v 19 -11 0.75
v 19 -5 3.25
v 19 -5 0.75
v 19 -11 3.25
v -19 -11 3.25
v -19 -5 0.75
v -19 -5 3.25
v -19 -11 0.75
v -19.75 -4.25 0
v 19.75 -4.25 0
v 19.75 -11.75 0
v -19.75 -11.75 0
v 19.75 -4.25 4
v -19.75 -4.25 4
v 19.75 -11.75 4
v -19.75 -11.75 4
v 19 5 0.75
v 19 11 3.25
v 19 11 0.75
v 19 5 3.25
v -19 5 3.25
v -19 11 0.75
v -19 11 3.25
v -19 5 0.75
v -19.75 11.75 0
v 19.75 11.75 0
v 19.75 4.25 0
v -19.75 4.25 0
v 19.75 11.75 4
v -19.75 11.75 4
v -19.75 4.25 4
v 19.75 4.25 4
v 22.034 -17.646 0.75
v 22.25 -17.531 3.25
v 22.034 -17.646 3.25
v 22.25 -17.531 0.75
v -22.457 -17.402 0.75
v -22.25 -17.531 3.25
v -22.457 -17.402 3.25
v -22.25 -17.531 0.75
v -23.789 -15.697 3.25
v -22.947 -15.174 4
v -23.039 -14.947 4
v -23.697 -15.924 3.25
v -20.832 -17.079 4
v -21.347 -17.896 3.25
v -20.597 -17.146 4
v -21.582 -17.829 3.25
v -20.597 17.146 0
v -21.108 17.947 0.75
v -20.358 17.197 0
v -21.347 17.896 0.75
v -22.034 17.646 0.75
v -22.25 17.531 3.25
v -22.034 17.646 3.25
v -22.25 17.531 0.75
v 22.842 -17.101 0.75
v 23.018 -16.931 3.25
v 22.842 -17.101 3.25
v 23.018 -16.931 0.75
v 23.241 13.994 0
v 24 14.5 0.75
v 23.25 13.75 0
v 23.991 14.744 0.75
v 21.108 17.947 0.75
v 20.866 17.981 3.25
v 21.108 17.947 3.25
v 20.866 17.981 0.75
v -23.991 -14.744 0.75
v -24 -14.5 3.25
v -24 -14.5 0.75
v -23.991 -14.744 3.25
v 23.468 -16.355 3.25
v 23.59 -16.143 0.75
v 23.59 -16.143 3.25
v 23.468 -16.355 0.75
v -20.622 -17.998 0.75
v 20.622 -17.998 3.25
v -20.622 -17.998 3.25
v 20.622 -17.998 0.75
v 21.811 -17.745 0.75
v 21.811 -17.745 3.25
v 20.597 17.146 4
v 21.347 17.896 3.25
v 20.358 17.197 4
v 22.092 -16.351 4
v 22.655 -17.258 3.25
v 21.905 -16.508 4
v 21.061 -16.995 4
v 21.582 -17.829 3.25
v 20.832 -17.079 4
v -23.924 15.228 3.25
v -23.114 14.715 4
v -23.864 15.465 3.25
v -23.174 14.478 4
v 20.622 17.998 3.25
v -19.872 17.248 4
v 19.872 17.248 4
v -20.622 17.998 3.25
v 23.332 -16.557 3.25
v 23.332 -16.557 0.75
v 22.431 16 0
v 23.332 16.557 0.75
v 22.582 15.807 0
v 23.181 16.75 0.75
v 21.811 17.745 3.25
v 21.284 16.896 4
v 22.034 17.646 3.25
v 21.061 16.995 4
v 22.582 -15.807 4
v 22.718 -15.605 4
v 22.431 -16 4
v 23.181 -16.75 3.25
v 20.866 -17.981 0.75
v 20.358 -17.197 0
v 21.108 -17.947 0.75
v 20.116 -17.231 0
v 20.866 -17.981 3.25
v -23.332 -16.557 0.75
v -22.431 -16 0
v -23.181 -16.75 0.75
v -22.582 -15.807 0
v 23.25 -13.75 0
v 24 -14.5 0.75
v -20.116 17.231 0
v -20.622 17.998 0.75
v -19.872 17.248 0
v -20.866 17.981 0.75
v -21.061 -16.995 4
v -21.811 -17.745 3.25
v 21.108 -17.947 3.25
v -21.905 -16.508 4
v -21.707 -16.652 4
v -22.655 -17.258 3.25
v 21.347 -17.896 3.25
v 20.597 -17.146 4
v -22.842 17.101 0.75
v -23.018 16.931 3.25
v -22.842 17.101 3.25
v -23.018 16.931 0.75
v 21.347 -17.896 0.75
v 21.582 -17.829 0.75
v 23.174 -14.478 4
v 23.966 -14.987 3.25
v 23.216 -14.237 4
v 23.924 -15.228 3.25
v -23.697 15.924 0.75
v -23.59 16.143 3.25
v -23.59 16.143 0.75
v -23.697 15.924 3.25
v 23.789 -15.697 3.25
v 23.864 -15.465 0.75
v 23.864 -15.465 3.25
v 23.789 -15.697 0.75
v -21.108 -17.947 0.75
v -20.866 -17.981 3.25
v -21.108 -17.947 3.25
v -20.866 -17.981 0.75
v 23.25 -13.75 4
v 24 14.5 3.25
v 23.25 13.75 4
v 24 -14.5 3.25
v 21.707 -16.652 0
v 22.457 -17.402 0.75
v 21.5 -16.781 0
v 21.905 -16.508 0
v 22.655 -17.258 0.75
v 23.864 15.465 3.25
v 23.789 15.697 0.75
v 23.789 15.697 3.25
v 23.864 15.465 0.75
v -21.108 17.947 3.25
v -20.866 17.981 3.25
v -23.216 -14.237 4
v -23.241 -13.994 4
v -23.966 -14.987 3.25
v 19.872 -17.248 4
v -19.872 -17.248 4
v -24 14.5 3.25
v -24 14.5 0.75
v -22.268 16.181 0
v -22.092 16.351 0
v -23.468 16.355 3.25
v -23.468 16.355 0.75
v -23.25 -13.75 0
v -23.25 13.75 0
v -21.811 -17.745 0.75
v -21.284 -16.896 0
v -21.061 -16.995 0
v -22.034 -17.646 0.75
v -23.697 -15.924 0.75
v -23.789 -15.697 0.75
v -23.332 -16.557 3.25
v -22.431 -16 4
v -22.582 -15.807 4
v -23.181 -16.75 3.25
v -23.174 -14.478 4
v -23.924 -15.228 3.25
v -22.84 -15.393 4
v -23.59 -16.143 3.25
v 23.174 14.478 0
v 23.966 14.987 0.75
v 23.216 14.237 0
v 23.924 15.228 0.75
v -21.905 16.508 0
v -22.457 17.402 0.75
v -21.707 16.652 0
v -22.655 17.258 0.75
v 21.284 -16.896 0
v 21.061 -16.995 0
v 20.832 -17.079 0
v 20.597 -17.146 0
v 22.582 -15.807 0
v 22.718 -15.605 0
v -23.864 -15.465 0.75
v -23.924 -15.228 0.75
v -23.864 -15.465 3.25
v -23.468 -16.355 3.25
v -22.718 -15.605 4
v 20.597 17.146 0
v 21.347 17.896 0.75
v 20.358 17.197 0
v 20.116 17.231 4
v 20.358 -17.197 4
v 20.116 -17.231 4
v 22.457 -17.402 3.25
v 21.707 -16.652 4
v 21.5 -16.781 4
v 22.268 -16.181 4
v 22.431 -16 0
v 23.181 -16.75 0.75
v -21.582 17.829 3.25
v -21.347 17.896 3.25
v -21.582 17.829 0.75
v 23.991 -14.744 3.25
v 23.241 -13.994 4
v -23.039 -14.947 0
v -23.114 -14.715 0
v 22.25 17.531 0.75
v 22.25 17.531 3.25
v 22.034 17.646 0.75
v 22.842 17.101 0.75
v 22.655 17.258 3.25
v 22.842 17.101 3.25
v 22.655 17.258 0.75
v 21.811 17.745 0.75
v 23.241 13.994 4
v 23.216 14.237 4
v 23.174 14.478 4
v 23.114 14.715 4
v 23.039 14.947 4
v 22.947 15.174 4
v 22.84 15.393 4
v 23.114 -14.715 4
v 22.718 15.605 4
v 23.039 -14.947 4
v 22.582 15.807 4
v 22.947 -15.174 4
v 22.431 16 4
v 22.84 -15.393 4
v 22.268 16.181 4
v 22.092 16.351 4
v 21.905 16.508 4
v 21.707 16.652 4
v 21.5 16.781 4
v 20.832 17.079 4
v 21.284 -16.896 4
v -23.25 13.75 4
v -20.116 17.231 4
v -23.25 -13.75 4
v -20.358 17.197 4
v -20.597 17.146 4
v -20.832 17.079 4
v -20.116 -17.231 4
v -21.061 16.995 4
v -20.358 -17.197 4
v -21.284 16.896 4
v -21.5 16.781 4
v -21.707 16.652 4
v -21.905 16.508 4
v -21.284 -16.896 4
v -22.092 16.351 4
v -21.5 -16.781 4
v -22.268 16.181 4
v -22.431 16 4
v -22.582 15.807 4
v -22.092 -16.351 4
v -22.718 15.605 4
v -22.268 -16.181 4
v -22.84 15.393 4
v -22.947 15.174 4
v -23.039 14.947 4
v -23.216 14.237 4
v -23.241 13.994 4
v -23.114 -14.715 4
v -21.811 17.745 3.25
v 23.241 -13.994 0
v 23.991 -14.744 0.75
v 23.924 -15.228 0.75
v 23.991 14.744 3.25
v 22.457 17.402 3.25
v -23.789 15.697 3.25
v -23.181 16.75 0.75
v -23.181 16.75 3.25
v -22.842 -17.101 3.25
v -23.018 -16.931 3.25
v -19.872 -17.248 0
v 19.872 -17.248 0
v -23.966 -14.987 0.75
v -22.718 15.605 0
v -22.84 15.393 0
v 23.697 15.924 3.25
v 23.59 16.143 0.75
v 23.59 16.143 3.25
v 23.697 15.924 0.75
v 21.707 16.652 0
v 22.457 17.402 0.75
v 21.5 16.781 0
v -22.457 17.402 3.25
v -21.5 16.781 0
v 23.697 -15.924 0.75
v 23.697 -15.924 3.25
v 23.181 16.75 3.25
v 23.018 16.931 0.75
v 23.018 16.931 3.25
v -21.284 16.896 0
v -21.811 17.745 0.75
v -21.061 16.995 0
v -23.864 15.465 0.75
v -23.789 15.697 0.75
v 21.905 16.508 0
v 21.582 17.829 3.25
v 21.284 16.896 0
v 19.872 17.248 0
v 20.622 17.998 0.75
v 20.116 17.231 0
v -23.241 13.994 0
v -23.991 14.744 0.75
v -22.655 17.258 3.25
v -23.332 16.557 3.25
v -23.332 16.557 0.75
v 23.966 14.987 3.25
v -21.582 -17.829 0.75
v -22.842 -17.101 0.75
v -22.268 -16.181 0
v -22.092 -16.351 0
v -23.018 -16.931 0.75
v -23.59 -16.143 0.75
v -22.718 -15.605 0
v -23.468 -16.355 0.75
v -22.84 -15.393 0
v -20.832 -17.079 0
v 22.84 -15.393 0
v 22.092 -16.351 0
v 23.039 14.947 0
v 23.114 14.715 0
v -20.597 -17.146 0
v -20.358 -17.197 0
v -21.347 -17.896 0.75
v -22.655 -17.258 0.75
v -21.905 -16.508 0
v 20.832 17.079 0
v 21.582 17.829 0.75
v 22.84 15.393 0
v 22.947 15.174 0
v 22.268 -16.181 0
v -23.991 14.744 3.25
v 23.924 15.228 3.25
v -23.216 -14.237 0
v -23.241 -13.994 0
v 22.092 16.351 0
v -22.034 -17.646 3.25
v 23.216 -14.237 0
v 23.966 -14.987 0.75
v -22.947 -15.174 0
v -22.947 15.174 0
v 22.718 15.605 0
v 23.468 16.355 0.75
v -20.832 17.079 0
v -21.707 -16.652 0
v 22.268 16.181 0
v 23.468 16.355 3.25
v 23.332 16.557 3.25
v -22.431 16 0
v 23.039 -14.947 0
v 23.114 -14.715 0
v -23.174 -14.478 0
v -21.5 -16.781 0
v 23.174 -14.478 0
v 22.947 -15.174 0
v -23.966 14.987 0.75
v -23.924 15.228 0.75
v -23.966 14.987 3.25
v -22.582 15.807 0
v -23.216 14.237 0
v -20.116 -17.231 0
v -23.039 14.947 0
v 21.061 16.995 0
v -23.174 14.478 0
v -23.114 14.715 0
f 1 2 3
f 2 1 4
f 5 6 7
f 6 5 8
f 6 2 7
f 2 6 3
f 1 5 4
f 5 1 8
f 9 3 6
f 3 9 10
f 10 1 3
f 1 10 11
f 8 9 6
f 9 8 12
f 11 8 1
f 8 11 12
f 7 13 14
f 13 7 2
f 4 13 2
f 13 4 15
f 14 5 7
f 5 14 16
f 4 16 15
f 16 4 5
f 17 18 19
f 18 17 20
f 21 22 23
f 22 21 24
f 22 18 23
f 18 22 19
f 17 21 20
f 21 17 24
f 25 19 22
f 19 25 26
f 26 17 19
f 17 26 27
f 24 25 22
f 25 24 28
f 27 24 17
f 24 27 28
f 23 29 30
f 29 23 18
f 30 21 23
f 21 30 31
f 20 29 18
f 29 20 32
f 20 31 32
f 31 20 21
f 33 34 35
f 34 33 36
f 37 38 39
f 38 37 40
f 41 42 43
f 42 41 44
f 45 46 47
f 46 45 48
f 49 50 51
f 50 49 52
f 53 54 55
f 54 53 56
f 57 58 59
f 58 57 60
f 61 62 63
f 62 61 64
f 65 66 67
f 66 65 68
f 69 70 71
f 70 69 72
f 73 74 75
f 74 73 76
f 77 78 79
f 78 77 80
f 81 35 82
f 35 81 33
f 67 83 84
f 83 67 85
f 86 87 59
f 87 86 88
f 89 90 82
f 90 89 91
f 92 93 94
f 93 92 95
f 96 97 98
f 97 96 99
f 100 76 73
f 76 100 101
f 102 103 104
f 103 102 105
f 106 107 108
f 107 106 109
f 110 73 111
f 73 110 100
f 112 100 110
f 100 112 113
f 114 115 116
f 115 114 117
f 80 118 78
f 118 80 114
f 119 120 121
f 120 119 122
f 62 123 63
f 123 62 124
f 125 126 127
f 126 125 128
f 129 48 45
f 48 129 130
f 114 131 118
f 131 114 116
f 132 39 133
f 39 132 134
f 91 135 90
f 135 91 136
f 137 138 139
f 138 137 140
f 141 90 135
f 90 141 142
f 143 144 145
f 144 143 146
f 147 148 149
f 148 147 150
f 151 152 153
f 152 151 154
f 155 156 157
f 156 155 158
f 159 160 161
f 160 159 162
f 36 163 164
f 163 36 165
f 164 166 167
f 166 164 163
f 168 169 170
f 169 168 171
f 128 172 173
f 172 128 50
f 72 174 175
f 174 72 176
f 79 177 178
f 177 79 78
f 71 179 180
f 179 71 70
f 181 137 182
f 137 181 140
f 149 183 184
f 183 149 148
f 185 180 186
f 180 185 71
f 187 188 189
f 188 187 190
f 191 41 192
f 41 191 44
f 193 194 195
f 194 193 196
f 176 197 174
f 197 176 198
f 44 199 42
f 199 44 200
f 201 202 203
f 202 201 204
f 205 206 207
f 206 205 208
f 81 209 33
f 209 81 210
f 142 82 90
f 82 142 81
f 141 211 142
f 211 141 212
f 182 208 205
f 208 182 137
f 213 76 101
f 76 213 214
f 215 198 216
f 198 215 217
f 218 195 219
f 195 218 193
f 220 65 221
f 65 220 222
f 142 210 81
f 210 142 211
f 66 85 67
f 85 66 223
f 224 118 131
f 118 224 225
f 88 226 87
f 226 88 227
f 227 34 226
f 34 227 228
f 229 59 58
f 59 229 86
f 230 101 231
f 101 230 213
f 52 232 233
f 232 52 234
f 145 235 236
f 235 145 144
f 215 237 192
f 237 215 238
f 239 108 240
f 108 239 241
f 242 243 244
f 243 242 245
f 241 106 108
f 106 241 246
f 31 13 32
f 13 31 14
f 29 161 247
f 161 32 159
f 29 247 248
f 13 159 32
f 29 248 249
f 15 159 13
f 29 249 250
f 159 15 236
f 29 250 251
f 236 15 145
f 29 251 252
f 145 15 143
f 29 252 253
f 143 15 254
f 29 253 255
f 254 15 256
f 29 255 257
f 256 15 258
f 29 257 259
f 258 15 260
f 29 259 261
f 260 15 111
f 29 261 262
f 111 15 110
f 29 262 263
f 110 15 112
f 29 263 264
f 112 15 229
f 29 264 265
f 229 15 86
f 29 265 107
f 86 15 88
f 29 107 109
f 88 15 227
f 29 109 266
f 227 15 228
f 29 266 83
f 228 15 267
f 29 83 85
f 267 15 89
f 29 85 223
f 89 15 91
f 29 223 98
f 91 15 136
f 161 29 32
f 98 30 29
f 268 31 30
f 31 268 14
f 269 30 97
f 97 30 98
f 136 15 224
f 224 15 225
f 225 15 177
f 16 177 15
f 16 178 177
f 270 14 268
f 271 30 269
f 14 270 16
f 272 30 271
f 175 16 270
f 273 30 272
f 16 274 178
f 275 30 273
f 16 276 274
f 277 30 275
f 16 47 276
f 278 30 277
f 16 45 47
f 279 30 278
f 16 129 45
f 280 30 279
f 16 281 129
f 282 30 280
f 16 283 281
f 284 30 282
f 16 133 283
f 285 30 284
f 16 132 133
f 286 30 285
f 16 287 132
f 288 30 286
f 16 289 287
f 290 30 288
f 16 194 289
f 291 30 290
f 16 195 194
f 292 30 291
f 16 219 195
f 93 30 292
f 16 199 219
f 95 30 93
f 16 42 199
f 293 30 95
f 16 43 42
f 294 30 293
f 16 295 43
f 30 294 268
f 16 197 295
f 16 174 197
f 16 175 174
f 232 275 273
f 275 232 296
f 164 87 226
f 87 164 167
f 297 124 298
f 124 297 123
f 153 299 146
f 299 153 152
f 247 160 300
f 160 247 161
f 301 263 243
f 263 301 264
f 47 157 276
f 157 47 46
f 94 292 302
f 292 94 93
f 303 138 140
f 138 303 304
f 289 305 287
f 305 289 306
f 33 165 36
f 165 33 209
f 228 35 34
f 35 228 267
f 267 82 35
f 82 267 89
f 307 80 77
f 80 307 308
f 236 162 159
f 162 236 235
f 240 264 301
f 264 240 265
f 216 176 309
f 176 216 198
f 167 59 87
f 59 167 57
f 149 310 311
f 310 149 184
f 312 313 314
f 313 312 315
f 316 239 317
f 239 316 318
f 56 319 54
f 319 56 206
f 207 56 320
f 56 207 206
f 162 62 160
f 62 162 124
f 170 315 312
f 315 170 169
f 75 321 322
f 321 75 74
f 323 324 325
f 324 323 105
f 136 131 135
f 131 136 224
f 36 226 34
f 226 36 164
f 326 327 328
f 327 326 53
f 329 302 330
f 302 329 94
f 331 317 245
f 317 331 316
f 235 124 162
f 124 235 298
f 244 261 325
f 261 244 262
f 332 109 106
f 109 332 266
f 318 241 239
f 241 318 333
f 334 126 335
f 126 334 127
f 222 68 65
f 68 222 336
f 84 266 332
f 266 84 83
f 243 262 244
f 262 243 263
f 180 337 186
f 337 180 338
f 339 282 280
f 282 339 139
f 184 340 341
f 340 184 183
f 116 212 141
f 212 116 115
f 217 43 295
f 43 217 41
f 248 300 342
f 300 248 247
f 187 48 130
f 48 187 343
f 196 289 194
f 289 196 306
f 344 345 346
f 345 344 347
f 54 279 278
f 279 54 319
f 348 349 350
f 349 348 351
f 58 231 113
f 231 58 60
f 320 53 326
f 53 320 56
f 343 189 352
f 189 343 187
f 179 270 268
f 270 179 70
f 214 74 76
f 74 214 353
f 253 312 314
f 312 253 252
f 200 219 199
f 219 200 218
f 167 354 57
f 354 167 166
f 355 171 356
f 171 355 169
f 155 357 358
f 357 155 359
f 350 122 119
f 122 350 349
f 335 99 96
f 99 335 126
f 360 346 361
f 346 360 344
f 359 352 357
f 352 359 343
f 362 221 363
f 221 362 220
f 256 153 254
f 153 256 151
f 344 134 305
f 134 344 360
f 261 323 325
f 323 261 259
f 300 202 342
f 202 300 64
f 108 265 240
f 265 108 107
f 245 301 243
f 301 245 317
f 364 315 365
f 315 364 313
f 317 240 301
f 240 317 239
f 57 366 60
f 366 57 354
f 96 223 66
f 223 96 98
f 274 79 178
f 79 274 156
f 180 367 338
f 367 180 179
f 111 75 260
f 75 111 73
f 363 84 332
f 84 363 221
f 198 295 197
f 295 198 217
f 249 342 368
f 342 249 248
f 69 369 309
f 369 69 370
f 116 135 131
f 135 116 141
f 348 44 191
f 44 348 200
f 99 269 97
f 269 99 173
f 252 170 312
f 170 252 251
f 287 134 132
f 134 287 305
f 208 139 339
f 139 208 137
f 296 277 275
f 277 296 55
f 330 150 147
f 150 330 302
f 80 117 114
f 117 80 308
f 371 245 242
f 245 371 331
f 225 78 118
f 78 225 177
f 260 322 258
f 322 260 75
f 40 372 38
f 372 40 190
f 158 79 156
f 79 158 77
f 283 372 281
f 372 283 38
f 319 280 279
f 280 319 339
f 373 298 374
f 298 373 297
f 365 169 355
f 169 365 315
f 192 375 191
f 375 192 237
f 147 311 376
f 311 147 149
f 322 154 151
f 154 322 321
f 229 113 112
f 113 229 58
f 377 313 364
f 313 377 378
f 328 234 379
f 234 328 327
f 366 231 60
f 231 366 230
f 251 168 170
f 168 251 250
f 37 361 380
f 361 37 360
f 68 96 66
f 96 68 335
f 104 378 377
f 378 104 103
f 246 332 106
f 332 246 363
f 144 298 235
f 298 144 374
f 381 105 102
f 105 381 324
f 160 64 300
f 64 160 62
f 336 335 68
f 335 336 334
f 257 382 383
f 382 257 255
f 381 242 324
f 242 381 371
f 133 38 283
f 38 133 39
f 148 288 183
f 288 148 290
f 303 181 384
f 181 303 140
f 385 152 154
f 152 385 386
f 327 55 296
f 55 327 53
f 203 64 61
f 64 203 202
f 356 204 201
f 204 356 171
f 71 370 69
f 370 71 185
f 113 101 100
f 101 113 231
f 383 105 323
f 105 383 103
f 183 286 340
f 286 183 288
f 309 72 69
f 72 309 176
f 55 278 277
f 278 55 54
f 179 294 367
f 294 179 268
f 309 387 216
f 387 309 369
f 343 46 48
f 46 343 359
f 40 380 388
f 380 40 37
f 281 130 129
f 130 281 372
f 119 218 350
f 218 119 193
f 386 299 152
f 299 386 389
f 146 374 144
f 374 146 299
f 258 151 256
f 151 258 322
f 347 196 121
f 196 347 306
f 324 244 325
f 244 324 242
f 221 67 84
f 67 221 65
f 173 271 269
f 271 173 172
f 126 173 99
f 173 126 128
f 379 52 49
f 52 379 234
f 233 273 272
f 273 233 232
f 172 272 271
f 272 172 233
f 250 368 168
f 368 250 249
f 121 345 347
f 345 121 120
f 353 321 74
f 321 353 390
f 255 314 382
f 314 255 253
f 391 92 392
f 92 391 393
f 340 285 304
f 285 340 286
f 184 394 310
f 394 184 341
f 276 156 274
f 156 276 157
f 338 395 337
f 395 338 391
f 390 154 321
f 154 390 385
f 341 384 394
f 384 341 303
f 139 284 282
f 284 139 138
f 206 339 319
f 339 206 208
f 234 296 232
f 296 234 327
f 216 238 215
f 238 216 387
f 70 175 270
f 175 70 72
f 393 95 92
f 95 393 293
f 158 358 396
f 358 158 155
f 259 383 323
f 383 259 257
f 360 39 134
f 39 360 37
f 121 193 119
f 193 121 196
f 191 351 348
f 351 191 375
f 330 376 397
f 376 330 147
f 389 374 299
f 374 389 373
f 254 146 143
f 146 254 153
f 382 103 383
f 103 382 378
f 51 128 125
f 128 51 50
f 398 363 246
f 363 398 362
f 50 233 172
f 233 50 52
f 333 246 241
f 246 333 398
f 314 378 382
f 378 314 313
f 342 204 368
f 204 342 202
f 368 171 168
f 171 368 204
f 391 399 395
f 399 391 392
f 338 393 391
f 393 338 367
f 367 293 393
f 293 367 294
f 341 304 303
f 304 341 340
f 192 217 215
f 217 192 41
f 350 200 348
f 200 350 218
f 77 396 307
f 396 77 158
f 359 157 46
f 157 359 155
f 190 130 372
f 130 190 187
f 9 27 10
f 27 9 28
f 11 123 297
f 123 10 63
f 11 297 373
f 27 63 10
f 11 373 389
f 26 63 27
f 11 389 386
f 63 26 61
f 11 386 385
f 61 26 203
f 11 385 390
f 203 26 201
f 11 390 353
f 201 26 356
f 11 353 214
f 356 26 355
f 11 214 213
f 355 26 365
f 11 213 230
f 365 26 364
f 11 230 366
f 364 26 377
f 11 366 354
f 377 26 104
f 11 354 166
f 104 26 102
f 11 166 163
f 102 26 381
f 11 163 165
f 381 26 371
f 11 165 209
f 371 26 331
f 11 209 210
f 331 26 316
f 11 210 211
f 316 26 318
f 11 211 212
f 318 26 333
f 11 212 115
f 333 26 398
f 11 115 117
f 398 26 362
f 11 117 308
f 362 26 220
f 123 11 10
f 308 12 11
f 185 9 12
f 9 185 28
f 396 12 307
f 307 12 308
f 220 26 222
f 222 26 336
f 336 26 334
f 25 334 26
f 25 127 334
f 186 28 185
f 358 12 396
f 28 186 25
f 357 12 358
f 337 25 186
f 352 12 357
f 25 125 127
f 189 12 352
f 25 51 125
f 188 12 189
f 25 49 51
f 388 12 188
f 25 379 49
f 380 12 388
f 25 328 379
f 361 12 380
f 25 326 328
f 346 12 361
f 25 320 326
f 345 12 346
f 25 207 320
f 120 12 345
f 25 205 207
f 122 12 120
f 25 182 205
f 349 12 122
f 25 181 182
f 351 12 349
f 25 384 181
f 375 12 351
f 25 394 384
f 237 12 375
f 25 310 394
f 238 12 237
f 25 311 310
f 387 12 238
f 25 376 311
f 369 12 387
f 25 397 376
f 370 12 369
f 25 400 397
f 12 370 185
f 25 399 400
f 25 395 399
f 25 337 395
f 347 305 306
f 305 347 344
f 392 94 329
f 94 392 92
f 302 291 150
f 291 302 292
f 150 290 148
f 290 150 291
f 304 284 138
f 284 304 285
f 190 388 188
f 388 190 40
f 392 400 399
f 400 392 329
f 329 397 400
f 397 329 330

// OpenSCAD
// [FL_INDEX: keywords="openscad, 3d_parametric, Walters_Customizable_Tri_Glide_with_broken_edges, csg_solid" | COT="Parametric OpenSCAD design from 3DCodeverse"]
// Title: Walters Customizable Tri Glide with broken edges

// License: Public Domain

//=== Flat Tri Glide ===//

//width of the webbing opening (1in = 25.4 mm)
_1_webbingOpeningWidth = 38;

// width of the gap for the webbing
_2_webbingGapWidth = 6;

// width of the side edges
_3_sideEdgeWidth = 5;

// width of the main edges
_4_mainEdgeWidth = 7;

// width of the center beam
_5_centerWidth = 10;

// overall thickness of the tri glide
_6_overallHeight = 4; //3

// percent corner rounding
_7_cornerRoundingPercent = 50; // [1:100]

// how much to break off the edges (in mm)
_8_cornerBreakage = 0.75;


module makeBody(xsize, ysize, height, radius) {
	translate([0,0,height/2]) {
		minkowski() {
			cube(size=[xsize-2*radius,ysize-2*radius, height/2], center = true);
			cylinder(r=radius, h=height/2, center=true);
		}
	}
}

module makeCuts(width, gap, thickness, height,b) {
	offset = (thickness+gap)/2;
	for (y = [-offset, offset]) {
		translate([0, y, 0]) {

			translate([0, 0, height/2])
				cube(size=[width, gap, height*2], center=true);
			translate([0, 0, 0])
				makeCutEnd(width, gap, thickness, height,b);
			translate([0, 0, height]) scale([1,1,-1])
				makeCutEnd(width, gap, thickness, height,b);
		}
	}
}

module makeCutEnd(width, gap, thickness, height,b)
{
	hull(){
		translate([0,0,+b/2])
			cube(size=[width, gap, b], center=true);
		translate([0,0,-b/2])
			cube(size=[width+2*b, gap+2*b, b], center=true);			
	}
}

module makeTriGlide(width, gap, edgeThicknessSide, edgeThicknessMain, centerThickness, height, rounding, b, $fn=90) {
	xsize = width + edgeThicknessSide * 2;
	ysize = centerThickness + edgeThicknessMain * 2 + gap * 2;
	radius = max(edgeThicknessSide,edgeThicknessMain)*(rounding/100);
	difference() {
        hull()
        {
		  makeBody(xsize-2*b, ysize-2*b, height, radius);
          translate([0,0,b])
		  makeBody(xsize, ysize, height-2*b, radius);
        }
		makeCuts(width, gap, centerThickness, height,b);
	}
}


makeTriGlide
  ( _1_webbingOpeningWidth
  , _2_webbingGapWidth
  , _3_sideEdgeWidth
  , _4_mainEdgeWidth
  , _5_centerWidth
  , _6_overallHeight
  , _7_cornerRoundingPercent
  ,_8_cornerBreakage
  );
